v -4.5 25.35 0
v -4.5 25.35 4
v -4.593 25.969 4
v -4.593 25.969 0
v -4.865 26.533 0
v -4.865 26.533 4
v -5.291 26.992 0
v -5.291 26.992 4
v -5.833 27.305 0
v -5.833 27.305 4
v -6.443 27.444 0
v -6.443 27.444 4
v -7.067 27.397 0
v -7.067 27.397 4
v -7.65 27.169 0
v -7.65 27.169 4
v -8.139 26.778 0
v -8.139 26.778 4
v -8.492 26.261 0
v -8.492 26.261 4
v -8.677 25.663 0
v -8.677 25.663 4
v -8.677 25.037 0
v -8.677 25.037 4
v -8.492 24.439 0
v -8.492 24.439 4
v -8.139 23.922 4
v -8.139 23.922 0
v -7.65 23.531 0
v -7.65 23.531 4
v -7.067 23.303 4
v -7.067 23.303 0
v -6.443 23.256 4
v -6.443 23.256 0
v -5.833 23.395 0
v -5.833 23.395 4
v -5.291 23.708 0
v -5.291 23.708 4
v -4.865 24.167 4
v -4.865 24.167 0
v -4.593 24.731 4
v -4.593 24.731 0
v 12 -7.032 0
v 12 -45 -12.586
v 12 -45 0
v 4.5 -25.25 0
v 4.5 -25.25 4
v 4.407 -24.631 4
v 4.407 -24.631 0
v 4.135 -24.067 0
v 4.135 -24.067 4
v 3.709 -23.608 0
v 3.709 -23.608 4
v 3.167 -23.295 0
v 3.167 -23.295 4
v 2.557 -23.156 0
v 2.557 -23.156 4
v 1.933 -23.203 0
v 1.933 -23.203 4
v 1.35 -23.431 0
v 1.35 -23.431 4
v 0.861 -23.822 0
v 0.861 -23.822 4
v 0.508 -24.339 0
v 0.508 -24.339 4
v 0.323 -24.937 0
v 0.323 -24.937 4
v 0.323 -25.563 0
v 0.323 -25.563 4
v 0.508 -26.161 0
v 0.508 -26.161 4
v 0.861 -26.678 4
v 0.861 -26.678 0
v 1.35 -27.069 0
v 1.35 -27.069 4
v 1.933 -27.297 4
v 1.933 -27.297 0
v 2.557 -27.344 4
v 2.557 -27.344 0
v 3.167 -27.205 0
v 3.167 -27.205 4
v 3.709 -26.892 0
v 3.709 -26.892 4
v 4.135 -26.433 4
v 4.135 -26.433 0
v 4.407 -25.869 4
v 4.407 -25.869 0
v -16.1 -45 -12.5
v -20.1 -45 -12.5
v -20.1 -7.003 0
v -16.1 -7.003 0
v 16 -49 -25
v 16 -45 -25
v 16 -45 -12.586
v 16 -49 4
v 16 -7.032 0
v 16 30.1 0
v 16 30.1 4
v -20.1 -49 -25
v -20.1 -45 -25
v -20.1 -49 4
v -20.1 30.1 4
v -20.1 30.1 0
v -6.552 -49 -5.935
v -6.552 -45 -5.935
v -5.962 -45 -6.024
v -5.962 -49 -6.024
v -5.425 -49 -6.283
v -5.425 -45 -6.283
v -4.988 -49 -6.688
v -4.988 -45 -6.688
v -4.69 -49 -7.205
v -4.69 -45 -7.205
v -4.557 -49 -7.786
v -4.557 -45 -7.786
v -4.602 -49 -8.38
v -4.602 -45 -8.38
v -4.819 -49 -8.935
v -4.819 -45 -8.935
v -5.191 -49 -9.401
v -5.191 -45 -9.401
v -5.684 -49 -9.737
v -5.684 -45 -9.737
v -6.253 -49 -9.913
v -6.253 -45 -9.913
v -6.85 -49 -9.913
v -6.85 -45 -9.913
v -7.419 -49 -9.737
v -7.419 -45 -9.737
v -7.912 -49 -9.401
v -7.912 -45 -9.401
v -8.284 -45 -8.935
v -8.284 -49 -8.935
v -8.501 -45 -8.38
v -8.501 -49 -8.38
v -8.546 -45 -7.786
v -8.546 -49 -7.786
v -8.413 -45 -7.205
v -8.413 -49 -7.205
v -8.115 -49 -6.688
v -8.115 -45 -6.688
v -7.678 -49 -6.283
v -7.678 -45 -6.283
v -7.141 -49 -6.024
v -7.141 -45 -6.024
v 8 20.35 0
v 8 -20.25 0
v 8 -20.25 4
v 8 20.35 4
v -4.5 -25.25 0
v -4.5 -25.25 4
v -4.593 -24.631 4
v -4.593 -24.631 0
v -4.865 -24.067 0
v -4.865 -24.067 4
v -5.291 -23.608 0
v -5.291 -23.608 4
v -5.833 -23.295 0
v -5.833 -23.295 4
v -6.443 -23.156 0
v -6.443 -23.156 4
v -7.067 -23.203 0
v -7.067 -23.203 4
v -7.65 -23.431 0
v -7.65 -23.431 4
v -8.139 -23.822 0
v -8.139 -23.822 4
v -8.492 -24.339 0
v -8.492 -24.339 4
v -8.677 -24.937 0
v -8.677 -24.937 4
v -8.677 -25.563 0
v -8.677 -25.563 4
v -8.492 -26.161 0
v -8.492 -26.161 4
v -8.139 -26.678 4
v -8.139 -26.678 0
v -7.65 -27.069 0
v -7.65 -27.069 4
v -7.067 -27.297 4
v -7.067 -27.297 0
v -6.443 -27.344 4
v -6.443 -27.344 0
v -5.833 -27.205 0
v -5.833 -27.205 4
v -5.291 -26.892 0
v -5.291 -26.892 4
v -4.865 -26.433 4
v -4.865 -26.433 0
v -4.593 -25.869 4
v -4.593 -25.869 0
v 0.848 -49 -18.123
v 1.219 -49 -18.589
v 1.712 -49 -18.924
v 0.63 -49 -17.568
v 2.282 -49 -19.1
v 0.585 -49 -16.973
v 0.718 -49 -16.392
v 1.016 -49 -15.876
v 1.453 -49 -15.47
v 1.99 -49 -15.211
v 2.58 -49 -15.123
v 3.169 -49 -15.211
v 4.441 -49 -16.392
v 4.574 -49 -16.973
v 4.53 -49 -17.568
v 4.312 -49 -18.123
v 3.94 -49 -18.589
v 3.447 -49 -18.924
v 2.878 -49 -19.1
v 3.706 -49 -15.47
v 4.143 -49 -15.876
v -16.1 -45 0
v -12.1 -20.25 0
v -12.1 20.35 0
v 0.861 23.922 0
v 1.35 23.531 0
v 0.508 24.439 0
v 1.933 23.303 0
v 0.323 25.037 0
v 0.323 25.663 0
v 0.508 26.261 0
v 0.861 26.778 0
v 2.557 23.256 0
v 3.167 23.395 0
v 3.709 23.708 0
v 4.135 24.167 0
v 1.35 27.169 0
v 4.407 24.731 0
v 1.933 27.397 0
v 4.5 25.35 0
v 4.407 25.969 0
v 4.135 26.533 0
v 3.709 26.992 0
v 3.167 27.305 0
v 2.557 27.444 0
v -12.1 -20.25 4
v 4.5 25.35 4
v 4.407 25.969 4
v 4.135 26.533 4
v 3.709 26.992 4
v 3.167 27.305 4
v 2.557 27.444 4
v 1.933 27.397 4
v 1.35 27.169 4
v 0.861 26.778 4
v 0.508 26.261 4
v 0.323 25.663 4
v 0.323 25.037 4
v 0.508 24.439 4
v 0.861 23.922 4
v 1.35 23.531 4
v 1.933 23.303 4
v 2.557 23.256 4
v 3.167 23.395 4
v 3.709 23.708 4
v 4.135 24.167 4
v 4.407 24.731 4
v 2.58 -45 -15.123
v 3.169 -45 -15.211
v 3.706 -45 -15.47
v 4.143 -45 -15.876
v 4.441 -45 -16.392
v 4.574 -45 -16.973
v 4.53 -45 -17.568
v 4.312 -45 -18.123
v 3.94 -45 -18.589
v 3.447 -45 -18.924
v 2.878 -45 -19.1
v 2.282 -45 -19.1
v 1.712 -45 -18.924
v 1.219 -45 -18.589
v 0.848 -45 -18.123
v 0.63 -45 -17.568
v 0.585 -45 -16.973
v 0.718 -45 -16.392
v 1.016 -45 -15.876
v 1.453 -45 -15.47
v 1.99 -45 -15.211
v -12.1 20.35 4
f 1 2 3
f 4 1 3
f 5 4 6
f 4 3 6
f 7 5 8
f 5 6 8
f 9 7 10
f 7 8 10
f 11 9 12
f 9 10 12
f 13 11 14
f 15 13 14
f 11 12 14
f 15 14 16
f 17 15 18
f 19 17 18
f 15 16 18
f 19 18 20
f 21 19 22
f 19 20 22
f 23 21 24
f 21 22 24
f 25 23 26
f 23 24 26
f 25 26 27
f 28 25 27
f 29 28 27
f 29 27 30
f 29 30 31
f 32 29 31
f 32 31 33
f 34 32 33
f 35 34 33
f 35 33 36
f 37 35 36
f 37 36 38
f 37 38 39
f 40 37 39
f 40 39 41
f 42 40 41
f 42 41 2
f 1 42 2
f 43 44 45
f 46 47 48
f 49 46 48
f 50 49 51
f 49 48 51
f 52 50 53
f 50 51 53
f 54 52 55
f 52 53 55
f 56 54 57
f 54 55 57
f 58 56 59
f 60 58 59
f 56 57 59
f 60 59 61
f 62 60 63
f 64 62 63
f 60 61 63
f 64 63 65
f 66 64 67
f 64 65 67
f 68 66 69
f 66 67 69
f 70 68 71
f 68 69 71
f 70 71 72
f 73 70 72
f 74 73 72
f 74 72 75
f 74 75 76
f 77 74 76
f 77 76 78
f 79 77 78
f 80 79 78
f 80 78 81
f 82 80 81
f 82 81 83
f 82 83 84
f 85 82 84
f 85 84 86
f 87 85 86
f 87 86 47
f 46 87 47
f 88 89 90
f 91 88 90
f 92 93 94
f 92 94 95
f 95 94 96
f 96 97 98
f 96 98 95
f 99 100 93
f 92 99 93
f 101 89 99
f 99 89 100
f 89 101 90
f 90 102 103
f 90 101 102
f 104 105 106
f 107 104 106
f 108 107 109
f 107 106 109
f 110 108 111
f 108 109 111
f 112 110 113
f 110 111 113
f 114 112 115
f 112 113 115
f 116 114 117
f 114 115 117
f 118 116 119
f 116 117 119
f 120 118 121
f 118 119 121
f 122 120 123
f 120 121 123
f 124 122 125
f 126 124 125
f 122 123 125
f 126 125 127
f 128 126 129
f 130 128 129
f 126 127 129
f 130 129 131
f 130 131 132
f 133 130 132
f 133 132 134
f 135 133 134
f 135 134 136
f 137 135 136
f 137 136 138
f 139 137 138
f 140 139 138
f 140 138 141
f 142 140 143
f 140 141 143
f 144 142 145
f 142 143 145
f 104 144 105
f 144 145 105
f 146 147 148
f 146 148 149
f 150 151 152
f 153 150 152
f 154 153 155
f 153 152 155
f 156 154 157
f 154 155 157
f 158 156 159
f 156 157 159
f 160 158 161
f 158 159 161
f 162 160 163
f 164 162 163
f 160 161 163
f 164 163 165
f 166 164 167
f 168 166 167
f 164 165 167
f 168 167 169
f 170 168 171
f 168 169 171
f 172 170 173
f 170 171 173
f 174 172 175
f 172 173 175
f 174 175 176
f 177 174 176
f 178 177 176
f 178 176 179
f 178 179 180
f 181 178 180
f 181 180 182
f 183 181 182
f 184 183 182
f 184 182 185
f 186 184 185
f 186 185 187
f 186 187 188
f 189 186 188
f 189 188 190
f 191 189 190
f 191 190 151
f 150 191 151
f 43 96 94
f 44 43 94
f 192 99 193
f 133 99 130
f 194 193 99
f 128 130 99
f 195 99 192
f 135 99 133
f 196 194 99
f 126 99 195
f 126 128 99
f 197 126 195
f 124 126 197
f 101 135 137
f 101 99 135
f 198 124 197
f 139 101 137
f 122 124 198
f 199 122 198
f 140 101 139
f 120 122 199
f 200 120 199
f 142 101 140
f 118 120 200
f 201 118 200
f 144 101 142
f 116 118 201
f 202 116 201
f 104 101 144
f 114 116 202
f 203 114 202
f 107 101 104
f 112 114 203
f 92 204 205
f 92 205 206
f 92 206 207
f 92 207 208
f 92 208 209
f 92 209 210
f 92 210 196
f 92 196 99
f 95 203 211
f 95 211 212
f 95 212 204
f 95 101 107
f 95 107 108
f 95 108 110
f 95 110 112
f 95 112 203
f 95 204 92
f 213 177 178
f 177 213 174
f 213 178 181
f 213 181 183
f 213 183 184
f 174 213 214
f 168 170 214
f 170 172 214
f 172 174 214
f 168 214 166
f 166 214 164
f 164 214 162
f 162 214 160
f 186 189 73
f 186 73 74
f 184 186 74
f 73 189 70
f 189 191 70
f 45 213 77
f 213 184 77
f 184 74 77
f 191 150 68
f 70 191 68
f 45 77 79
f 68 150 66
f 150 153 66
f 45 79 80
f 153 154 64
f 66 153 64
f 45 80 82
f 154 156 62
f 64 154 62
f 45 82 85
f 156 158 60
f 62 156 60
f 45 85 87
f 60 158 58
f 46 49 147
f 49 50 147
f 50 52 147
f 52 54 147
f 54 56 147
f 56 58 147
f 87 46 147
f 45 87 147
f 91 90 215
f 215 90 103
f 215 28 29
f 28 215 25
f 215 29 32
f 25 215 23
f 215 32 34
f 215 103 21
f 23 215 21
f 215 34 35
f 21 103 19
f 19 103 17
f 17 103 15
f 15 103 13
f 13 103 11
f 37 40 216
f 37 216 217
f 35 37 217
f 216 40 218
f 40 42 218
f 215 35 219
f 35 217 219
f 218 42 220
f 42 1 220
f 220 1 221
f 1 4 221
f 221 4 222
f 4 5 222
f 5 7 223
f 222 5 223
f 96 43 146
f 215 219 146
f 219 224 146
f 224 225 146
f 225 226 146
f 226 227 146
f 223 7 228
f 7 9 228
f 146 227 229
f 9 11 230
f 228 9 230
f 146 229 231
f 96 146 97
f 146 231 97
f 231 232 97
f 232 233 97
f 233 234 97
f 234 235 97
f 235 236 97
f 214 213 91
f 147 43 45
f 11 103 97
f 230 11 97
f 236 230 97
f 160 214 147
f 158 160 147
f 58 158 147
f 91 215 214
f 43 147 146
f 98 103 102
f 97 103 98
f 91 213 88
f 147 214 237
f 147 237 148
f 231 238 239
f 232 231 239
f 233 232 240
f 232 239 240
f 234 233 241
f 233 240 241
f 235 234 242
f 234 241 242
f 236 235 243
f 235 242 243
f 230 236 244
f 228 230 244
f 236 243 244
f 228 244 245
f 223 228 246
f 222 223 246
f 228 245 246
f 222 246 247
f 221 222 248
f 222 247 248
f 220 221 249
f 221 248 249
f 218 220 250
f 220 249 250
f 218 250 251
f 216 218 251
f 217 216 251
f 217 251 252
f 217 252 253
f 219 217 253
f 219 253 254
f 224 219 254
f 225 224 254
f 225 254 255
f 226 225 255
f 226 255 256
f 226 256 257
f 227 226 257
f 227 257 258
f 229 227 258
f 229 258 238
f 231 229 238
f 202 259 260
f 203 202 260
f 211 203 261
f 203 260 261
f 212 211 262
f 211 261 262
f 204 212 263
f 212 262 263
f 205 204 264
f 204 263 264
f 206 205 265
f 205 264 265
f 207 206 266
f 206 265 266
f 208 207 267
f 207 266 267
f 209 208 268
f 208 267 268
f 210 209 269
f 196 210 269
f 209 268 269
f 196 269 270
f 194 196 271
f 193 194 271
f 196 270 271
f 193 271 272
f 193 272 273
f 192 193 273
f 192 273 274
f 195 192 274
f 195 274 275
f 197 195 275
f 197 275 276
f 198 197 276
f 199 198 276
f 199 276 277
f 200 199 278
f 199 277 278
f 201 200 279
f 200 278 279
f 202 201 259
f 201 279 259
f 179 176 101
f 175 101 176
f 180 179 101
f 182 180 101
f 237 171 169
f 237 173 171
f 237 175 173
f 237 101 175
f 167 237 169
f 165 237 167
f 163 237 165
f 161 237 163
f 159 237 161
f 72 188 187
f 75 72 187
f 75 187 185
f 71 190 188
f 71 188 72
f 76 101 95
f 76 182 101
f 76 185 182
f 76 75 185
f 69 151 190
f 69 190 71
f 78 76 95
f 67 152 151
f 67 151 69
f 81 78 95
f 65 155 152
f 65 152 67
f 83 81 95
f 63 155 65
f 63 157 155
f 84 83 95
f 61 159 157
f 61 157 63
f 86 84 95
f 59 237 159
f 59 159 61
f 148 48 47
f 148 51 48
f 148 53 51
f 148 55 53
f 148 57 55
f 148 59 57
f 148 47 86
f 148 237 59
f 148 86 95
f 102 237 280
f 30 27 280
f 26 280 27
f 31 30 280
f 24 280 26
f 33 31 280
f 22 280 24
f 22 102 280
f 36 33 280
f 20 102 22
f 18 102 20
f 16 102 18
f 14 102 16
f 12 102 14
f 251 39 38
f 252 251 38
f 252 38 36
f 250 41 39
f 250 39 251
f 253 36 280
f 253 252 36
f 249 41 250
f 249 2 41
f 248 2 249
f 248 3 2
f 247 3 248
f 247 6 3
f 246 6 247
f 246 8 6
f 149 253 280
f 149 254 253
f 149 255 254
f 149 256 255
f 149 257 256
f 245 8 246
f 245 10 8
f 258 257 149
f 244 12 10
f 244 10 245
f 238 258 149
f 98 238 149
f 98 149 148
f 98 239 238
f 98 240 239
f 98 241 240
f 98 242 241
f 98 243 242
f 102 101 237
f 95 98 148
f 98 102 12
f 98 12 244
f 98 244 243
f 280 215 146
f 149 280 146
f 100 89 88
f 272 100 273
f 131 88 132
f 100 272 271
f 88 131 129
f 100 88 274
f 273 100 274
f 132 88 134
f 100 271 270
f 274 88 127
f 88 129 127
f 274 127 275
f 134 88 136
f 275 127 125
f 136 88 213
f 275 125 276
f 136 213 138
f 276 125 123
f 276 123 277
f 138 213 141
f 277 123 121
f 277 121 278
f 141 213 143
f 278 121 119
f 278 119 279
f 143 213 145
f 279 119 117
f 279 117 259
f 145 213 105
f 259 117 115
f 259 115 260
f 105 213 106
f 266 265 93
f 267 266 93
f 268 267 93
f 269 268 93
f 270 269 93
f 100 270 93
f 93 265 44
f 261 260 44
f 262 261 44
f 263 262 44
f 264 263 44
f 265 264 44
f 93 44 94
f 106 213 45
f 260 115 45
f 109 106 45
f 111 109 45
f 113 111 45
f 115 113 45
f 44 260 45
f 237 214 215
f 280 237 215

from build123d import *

# Parameters (mm, degrees)
SKETCH1_W           = 36.1
SKETCH1_H           = 75.1
SKETCH1_W_2         = 20.1
SKETCH1_H_2         = 40.6
BOSS_EXTRUDE1_DEPTH = 4
SKETCH3_W           = 36.1
SKETCH3_H           = 4
BOSS_EXTRUDE3_DEPTH = 29
BOSS_EXTRUDE4_DEPTH = 4
BOSS_EXTRUDE5_DEPTH = 4
SKETCH12_R          = 2
CUT_EXTRUDE2_DEPTH  = 4
SKETCH16_R          = 2.1
CUT_EXTRUDE3_DEPTH  = 61.382199364


with BuildPart() as part:
    # Sketch1 → Boss-Extrude1 (new body)
    with BuildSketch(Plane.XY):
        with Locations((-2.05, -7.45)):
            Rectangle(SKETCH1_W, SKETCH1_H)
        with Locations((-2.05, 0.05)):
            Rectangle(SKETCH1_W_2, SKETCH1_H_2, mode=Mode.SUBTRACT)
    extrude(amount=BOSS_EXTRUDE1_DEPTH)

    # Sketch3 → Boss-Extrude3 (add)
    with BuildSketch(Plane.XY.offset(4)):
        with Locations((-2.05, -47)):
            Rectangle(SKETCH3_W, SKETCH3_H)
    extrude(amount=-BOSS_EXTRUDE3_DEPTH)

    # Sketch9 → Boss-Extrude4 (add)
    with BuildSketch(Plane(origin=(16, 0, 0), x_dir=(0, 0, -1), z_dir=(1, 0, 0))):
        Polygon((0, -7.031601619), (12.585734956, -45), (0, -45), align=None)
    extrude(amount=-BOSS_EXTRUDE4_DEPTH)

    # Sketch11 → Boss-Extrude5 (add)
    with BuildSketch(Plane.ZY.offset(20.1)):
        Polygon((-12.5, -45), (0, -7.003289616), (0, -45), align=None)
    extrude(amount=-BOSS_EXTRUDE5_DEPTH)

    # Sketch12 → Cut-Extrude2 (cut)
    with BuildSketch(Plane(origin=(0, -45, 0), x_dir=(1, 0, 0), z_dir=(0, 1, 0))):
        with Locations(Location((2.57967866, 17.122546138, 0), (0, 0, 270))):
            Circle(SKETCH12_R)
        with Locations(Location((-6.551547439, 7.935229344, 0), (0, 0, 270))):
            Circle(SKETCH12_R)
    extrude(amount=-CUT_EXTRUDE2_DEPTH, mode=Mode.SUBTRACT)

    # Sketch16 → Cut-Extrude3 (cut, through all)
    with BuildSketch(Plane.XY.offset(4)):
        with Locations((-6.6, 25.35)):
            Circle(SKETCH16_R)
        with Locations((2.4, 25.35)):
            Circle(SKETCH16_R)
        with Locations((-6.6, -25.25)):
            Circle(SKETCH16_R)
        with Locations((2.4, -25.25)):
            Circle(SKETCH16_R)
    extrude(amount=-CUT_EXTRUDE3_DEPTH, mode=Mode.SUBTRACT)


solid = part.part
